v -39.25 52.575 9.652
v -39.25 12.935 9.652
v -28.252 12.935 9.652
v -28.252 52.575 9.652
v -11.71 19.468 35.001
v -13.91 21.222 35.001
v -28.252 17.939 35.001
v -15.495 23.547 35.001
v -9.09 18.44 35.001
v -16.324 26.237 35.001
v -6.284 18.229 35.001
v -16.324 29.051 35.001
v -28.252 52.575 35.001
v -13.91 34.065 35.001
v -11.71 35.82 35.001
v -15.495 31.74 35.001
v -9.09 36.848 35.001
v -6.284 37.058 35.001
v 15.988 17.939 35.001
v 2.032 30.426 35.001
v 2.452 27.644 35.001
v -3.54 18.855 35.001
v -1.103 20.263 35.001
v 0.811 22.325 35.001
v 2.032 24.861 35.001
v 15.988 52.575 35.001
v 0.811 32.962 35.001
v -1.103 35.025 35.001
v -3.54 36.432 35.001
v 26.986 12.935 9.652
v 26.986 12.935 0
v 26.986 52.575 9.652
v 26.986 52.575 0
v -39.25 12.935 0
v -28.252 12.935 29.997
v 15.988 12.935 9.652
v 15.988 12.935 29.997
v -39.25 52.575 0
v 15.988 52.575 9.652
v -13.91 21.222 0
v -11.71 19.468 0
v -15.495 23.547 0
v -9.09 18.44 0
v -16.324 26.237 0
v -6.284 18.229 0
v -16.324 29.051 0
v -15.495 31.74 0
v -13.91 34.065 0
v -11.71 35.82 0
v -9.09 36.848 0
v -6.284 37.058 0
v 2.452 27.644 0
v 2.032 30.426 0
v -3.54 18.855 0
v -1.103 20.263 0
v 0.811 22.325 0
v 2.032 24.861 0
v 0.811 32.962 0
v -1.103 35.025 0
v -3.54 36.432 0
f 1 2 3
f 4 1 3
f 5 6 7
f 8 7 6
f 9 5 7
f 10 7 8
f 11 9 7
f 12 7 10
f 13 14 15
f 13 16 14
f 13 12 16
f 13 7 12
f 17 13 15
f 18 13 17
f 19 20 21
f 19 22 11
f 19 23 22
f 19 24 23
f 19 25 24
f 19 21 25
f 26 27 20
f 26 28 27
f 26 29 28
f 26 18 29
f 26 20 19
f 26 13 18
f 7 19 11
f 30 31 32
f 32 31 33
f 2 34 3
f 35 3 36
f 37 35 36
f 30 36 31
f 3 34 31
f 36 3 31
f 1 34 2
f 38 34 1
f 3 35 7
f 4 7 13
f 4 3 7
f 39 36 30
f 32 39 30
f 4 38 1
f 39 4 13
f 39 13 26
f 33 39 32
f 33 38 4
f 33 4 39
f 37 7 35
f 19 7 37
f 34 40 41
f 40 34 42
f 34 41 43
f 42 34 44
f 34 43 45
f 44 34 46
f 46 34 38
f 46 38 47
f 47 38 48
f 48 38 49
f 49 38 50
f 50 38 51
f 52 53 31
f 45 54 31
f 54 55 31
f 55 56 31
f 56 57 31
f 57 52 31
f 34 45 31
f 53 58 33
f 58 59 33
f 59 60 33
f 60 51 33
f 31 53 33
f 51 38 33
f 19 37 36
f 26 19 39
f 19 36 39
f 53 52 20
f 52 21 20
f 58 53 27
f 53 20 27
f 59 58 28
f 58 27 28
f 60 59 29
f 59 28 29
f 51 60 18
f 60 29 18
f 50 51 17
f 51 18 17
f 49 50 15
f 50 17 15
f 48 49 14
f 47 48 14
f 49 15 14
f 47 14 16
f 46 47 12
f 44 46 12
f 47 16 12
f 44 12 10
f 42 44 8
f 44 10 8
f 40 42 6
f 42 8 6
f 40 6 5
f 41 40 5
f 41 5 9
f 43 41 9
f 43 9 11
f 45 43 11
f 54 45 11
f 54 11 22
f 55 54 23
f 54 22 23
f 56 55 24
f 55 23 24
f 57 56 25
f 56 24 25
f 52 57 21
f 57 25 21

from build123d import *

# Parameters (mm, degrees)
F0_W     = 44.2396106267
F0_H     = 39.6395683834
F1_DEPTH = 35.0012
F0_W_2   = 10.9982
F2_DEPTH = 9.652
F3_SIZE  = 5.0038
F4_R     = 2.3661353078
F5_DEPTH = 12.7
F6_R     = 9.4407644239
F7_DEPTH = 41.91


with BuildPart() as f1:
    # F0 (on Top) → F1 (new body)
    with BuildSketch(Plane.XY):
        with Locations((-6.1320435831, 32.7550717629)):
            Rectangle(F0_W, F0_H)
    extrude(amount=F1_DEPTH)

    # F0 (on Top) → F2 (join)
    with BuildSketch(Plane.XY):
        with Locations((21.4868617302, 32.7550717629)):
            Rectangle(F0_W_2, F0_H)
        with Locations((-33.7509488964, 32.7550717629)):
            Rectangle(F0_W_2, F0_H)
    extrude(amount=F2_DEPTH)

    # F3
    f3_edges = [f1.edges().sort_by_distance(p)[0] for p in [
        (-6.132044, 12.935288, 35.0012),
    ]]
    chamfer(f3_edges, length=F3_SIZE)

    # F4 (on Right) → F5 (join, symmetric)
    with BuildSketch(Plane.YZ):
        with Locations((21.8015406281, 29.3079074472)):
            Circle(F4_R)
    extrude(amount=F5_DEPTH, both=True)

    # F6 (on Top) → F7 (cut, symmetric)
    with BuildSketch(Plane.XY):
        with Locations((-6.9891391322, 27.6436116546)):
            Circle(F6_R)
    extrude(amount=F7_DEPTH, both=True, mode=Mode.SUBTRACT)


solid = f1.part
